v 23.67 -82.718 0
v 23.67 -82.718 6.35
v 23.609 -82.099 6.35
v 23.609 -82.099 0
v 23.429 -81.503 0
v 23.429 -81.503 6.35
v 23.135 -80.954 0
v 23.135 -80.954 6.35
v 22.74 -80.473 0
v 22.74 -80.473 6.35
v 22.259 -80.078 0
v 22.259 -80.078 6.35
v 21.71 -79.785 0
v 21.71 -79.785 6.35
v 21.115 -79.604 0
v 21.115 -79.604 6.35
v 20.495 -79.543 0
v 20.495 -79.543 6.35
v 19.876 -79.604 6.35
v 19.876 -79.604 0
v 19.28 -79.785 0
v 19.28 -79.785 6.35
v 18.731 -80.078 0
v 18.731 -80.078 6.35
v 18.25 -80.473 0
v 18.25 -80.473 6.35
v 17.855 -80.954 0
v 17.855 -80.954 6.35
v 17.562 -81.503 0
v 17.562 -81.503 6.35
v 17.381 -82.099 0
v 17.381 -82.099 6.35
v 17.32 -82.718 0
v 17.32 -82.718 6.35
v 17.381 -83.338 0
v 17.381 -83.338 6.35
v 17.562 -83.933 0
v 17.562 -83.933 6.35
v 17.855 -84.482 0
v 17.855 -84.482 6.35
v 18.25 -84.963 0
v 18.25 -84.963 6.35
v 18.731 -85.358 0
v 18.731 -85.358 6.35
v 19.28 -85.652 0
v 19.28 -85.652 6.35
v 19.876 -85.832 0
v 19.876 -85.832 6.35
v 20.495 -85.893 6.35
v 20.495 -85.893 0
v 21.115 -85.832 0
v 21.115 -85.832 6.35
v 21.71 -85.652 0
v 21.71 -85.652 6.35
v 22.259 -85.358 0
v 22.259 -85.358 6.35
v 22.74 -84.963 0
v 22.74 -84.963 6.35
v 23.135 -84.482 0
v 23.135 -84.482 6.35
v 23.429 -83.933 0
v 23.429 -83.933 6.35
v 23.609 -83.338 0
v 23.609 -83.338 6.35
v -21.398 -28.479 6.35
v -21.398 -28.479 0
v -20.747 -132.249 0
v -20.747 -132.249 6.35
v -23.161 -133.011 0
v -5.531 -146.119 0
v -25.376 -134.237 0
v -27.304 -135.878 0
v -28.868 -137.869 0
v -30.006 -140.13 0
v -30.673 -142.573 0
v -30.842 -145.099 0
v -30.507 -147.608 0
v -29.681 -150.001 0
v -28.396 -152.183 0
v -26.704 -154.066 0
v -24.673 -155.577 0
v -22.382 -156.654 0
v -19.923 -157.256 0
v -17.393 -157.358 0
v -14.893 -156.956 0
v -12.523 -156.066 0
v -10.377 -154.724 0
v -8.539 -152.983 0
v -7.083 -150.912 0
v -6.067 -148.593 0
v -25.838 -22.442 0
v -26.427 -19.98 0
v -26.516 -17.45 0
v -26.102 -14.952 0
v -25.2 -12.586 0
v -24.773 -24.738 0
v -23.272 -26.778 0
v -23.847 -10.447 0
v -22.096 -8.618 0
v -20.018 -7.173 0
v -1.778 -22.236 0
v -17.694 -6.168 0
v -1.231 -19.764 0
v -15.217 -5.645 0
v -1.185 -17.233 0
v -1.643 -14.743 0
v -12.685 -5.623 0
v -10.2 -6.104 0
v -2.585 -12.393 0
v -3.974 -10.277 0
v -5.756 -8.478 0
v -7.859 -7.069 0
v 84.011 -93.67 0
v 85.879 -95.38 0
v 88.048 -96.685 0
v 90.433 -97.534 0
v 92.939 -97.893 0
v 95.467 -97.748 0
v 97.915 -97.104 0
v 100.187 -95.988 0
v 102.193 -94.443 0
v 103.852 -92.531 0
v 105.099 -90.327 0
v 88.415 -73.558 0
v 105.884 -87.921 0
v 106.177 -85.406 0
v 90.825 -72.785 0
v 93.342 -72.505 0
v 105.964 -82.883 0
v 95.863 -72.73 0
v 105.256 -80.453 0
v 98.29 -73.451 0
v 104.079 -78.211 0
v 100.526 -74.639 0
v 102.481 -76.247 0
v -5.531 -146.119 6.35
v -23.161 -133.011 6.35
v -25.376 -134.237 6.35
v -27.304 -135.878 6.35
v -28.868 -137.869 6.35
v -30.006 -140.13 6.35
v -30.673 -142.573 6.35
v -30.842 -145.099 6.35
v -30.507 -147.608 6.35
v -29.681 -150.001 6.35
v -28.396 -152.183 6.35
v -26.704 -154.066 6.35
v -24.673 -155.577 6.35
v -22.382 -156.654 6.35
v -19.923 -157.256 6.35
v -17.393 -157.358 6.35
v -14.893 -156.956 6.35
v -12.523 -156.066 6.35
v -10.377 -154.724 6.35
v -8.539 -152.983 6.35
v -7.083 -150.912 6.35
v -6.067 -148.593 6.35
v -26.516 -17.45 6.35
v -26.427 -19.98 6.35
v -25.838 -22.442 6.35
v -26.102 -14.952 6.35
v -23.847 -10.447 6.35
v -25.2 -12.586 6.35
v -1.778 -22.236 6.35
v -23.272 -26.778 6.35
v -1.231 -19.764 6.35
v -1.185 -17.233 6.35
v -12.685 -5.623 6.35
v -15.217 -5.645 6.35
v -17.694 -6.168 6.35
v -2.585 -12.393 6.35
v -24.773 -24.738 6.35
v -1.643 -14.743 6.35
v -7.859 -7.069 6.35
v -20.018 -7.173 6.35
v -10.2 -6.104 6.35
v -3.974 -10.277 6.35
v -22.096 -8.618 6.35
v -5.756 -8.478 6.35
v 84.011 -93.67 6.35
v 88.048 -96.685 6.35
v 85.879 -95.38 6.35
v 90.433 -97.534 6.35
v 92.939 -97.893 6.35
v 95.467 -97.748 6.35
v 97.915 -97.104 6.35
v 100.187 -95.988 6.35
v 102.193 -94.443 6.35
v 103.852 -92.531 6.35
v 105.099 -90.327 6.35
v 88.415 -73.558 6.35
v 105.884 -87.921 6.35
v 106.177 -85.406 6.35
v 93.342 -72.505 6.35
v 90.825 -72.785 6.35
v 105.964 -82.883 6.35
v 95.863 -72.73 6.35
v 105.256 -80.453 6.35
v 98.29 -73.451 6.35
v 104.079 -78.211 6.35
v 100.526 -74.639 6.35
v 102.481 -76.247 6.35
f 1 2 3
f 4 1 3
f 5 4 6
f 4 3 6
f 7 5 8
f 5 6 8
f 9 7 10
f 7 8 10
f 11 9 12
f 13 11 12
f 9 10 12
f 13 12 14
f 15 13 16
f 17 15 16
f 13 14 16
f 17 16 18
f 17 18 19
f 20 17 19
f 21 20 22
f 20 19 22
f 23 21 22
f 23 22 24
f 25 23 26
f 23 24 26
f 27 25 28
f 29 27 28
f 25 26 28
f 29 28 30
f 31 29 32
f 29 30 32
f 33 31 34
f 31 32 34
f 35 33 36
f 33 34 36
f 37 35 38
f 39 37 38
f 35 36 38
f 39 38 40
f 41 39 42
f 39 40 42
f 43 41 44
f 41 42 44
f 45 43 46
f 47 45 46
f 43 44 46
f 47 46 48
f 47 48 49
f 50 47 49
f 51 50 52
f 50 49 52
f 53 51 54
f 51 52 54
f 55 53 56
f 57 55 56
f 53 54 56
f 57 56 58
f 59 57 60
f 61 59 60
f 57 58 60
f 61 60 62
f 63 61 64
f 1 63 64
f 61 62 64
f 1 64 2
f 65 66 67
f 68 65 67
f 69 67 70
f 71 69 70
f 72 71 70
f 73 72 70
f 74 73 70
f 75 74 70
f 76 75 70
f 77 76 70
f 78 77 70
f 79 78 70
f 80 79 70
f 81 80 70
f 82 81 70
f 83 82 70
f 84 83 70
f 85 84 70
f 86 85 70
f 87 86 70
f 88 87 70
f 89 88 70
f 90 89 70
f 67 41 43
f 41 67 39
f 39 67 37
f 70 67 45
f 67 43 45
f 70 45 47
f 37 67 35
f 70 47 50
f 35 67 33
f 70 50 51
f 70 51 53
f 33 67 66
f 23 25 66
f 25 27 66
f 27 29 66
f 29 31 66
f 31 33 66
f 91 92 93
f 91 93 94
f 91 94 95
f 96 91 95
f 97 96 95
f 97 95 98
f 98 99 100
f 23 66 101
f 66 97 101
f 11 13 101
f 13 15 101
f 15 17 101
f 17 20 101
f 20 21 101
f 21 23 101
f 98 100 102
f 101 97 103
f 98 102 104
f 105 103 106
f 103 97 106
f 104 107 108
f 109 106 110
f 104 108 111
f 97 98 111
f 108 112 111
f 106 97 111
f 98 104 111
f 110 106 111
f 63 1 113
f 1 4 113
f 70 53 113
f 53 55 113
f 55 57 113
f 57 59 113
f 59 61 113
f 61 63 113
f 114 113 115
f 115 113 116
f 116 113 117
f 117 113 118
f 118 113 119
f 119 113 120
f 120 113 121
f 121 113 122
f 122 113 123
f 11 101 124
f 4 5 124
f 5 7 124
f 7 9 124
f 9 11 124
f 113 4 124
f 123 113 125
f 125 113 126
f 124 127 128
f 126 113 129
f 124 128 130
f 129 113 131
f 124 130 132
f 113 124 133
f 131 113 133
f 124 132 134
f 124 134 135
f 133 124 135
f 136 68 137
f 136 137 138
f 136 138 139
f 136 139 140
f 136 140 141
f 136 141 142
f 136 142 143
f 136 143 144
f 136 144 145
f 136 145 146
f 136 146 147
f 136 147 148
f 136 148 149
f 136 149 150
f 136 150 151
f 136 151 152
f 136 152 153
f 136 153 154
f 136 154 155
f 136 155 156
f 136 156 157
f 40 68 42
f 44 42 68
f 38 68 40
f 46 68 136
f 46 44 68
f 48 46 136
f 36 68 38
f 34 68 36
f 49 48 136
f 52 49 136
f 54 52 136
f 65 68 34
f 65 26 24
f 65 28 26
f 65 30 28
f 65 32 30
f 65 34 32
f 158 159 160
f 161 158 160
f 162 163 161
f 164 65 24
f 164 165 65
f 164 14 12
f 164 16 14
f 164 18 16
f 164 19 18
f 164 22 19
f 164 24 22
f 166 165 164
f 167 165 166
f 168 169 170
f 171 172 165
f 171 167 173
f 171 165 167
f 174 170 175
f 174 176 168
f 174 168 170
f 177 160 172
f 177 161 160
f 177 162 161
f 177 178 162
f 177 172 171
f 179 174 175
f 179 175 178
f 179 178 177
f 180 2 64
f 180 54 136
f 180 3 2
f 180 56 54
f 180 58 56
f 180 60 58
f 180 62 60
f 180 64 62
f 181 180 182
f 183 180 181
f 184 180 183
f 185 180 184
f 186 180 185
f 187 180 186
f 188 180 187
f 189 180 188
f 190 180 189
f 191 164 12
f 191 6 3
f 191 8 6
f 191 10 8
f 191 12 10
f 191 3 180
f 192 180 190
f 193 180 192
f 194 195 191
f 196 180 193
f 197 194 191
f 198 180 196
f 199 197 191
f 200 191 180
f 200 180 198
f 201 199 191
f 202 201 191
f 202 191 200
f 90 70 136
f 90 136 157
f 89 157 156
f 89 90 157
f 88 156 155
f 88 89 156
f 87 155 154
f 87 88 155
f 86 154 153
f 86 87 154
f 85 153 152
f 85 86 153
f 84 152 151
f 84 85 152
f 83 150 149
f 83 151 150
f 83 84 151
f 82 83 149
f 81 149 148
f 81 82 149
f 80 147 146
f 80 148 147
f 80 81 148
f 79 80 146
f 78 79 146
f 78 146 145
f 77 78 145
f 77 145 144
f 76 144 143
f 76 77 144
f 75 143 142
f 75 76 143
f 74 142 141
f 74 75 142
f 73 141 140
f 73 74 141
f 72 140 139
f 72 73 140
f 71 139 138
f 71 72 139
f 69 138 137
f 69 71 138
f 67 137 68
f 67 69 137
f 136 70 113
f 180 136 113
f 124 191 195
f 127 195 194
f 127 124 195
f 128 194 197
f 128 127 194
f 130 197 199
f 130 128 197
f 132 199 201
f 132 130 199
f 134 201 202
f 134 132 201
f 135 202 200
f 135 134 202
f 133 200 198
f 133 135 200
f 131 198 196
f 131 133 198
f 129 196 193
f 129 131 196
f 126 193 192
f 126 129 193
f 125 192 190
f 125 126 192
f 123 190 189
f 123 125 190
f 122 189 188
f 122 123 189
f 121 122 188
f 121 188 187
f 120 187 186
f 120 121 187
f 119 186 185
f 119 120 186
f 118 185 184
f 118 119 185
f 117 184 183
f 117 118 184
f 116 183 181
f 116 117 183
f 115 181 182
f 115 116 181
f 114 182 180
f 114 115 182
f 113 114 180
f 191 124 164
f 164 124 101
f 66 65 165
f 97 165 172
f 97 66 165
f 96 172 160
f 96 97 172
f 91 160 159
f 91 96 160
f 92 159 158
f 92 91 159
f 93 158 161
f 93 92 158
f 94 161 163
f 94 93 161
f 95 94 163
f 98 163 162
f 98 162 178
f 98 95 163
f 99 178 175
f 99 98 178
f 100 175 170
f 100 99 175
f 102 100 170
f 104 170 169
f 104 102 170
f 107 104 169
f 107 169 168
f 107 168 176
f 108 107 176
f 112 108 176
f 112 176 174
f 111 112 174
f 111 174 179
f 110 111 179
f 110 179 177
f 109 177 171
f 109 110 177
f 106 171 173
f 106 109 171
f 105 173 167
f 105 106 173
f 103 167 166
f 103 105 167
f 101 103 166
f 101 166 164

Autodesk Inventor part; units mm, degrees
ref_plane "YZ Plane" through (0, 0, 0) normal (1, 0, 0) x (0, 1, 0)
ref_plane "XZ Plane" through (0, 0, 0) normal (0, 1, 0) x (-1, 0, 0)
ref_plane "XY Plane" through (0, 0, 0) normal (0, 0, 1) x (1, 0, 0)
sketch "Sketch1" plane through (0, 0, 0) normal (0, 0, 1) x (1, 0, 0)
  circle A0 centre (-13.8429, -18.2704) radius 12.7 projected
  circle A1 centre (93.4781, -85.2045) radius 12.7 projected
  circle A2 centre (-18.149, -144.6801) radius 12.7 projected
  line L0 (103.5984, -82.1974) -> (-21.5072, -11.0096)
  line L1 (-21.5072, -11.0096) -> (-20.6049, -154.9481)
  line L2 (-20.6049, -154.9481) -> (103.5984, -82.1974)
  point P0 (0, 0)
  point P1 (-21.3977, -28.479)
  point P2 (-1.7779, -22.236)
  point P3 (88.4146, -73.5575)
  point P4 (84.0113, -93.6703)
  point P5 (-20.7472, -132.2488)
  point P6 (-5.5307, -146.1185)
extrude "Extrusion1" add sketch "Sketch1" along normal blind 6.35
sketch "Sketch2" plane through (0, 0, 6.35) normal (0, 0, 1) x (1, 0, 0)
  line L0 (-5.5307, -146.1185) -> (84.0113, -93.6703) projected
  line L1 (88.4146, -73.5575) -> (-1.7779, -22.236) projected
  line L2 (-21.3977, -28.479) -> (-20.7472, -132.2488) projected
  line L3 (43.3184, -47.8967) -> (11.3485, -104.0805) construction
  line L4 (39.2403, -119.8944) -> (11.3485, -72.2762) construction
  line L5 (-21.0724, -80.3639) -> (51.2351, -79.9106) construction
  line L6 (20.479, -80.1034) -> (20.5282, -87.9482) construction
  line L7 (15.9498, -80.1318) -> (22.7682, -84.0116) construction
  line L8 (25.0082, -80.075) -> (18.239, -84.04) construction
  circle A0 centre (20.4954, -82.7183) radius 3.175
  point P0 (0, 0)
  dimension "d2" = 6.35
extrude "Extrusion2" cut sketch "Sketch2" against normal through all
properties part number "motorPlate" material "Aluminum 6061"
